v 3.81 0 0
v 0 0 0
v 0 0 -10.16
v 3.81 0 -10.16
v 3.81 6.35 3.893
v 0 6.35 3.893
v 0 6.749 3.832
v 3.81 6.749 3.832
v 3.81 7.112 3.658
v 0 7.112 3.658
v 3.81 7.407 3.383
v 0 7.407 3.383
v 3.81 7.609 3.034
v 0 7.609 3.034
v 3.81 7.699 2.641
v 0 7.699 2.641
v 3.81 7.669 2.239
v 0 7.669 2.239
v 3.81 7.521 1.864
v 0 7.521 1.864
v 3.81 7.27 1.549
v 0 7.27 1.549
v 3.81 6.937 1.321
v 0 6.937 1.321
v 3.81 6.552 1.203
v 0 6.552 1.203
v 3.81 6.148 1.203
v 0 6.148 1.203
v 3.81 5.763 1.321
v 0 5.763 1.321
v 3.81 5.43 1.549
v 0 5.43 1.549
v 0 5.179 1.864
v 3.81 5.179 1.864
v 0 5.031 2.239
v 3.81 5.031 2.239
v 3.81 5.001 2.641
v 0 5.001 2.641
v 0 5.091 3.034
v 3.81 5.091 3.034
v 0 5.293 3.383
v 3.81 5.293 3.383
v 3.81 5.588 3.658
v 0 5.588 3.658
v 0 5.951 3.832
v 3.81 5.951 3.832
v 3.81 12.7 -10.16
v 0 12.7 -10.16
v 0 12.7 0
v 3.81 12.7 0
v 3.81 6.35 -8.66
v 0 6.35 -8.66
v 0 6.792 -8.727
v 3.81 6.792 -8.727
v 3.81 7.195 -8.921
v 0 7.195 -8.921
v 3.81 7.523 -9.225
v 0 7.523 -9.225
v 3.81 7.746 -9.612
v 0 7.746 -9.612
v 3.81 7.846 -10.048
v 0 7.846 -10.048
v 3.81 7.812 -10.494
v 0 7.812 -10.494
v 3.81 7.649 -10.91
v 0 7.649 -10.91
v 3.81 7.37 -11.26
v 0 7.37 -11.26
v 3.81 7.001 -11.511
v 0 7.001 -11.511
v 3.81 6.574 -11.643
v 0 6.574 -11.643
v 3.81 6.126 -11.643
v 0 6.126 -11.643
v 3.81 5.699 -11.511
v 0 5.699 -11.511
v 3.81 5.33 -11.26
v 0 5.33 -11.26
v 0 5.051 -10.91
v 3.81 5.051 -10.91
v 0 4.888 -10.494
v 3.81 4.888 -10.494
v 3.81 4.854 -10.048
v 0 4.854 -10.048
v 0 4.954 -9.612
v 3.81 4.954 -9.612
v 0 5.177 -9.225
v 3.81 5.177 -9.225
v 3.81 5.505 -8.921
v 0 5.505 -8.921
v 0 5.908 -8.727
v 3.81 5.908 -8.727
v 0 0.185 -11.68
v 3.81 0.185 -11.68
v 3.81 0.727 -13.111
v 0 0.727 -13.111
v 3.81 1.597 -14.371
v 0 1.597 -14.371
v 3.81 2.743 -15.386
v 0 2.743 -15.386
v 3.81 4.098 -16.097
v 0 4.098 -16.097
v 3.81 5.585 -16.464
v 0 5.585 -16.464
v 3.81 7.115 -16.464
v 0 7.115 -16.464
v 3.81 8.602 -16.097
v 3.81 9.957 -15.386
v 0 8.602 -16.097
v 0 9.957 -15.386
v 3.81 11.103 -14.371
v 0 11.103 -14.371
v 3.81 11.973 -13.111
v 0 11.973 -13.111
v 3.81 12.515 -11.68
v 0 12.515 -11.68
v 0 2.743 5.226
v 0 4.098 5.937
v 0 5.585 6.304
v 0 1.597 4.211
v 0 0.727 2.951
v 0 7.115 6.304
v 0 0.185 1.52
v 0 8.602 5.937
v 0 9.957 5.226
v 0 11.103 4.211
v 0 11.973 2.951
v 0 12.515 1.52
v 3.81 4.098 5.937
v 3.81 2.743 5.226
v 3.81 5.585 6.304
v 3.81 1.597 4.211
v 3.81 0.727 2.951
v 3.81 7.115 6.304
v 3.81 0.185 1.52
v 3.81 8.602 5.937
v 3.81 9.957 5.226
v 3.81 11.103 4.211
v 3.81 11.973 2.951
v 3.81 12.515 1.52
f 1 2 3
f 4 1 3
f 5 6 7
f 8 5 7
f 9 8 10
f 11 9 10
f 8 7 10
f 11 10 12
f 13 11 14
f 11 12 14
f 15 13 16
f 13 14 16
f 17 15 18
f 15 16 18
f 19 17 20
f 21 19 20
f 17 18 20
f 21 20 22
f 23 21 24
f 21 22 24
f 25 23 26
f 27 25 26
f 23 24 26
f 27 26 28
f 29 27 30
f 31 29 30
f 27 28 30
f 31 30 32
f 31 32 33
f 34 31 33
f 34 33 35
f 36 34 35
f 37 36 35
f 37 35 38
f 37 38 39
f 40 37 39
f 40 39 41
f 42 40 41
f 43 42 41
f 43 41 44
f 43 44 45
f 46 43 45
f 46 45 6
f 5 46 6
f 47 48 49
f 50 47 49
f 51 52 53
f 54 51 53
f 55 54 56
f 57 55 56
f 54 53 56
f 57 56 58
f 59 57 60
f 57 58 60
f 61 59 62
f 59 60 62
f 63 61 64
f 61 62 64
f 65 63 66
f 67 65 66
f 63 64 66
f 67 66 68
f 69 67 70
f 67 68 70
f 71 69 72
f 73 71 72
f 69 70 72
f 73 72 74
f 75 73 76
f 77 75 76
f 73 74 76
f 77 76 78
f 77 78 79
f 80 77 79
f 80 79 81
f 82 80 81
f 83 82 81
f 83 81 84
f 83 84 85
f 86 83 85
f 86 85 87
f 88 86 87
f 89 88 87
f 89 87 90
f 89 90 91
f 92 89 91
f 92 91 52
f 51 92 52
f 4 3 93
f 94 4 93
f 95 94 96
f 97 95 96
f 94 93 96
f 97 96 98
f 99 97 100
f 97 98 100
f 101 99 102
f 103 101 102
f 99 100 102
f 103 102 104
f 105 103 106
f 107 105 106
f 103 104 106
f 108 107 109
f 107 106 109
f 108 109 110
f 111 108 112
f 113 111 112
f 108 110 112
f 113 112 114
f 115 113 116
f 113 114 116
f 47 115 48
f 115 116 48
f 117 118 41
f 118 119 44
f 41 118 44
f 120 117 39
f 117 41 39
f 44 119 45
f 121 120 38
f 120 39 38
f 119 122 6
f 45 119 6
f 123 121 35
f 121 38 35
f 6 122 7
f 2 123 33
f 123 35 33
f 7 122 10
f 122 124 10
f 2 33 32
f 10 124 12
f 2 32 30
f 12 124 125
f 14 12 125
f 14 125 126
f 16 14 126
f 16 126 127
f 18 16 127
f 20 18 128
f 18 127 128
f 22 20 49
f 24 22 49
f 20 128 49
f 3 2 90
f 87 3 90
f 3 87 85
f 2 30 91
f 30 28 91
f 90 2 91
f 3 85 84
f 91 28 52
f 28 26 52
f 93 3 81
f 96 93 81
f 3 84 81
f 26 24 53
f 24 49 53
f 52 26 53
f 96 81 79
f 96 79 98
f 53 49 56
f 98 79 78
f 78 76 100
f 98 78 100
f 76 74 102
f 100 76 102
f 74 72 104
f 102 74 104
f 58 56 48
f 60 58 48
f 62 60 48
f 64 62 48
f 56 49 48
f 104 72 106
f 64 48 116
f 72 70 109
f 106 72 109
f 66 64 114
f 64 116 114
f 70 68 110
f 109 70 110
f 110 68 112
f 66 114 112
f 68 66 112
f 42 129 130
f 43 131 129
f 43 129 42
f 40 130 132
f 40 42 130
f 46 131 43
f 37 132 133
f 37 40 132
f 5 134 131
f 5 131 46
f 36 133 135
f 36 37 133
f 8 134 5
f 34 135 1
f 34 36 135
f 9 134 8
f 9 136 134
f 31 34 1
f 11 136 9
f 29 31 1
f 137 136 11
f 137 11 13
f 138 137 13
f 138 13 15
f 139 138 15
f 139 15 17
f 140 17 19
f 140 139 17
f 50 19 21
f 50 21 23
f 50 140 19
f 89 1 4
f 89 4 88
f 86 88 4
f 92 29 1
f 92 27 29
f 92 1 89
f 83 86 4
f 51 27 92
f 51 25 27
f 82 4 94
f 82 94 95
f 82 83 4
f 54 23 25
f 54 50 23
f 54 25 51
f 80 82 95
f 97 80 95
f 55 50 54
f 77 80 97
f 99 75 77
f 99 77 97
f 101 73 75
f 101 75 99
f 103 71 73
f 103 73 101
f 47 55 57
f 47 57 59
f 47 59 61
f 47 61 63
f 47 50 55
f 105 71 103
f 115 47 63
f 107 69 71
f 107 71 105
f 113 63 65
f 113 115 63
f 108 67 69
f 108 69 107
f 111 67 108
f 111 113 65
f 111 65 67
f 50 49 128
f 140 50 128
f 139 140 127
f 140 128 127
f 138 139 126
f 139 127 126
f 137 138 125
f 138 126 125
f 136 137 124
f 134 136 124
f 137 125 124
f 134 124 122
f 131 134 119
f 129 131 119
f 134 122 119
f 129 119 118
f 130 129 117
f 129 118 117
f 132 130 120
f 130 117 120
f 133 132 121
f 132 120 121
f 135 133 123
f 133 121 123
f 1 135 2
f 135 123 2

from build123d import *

# Parameters (mm, degrees)
BOSS_EXTRUDE1_DEPTH   = 3.81
F_6_32_TAPPED_HOLE1_D = 2.7051
F_3_0MM_DOWEL_HOLE1_D = 3


with BuildPart() as part:
    # Sketch1 → Boss-Extrude1 (new body)
    with BuildSketch(Plane(origin=(0, 0, 0), x_dir=(0, 0, -1), z_dir=(1, 0, 0))):
        with BuildLine():
            Line((0, 0), (10.16, 0))
            ThreePointArc((10.16, 0), (16.51, 6.35), (10.16, 12.7))
            Line((10.16, 12.7), (0, 12.7))
            ThreePointArc((0, 12.7), (-6.35, 6.35), (0, 0))
        make_face()
    extrude(amount=BOSS_EXTRUDE1_DEPTH)

    # #6-32 Tapped Hole1 (through all)
    with Locations(Plane(origin=(3.81, 0, 0), x_dir=(0, 0, -1), z_dir=(1, 0, 0))):
        with Locations((-2.54, 6.35)):
            Hole(F_6_32_TAPPED_HOLE1_D / 2)

    # Ø3.0mm Dowel Hole1 (through all)
    with Locations(Plane(origin=(3.81, 0, 0), x_dir=(0, 0, -1), z_dir=(1, 0, 0))):
        with Locations((10.16, 6.35)):
            Hole(F_3_0MM_DOWEL_HOLE1_D / 2)


solid = part.part
